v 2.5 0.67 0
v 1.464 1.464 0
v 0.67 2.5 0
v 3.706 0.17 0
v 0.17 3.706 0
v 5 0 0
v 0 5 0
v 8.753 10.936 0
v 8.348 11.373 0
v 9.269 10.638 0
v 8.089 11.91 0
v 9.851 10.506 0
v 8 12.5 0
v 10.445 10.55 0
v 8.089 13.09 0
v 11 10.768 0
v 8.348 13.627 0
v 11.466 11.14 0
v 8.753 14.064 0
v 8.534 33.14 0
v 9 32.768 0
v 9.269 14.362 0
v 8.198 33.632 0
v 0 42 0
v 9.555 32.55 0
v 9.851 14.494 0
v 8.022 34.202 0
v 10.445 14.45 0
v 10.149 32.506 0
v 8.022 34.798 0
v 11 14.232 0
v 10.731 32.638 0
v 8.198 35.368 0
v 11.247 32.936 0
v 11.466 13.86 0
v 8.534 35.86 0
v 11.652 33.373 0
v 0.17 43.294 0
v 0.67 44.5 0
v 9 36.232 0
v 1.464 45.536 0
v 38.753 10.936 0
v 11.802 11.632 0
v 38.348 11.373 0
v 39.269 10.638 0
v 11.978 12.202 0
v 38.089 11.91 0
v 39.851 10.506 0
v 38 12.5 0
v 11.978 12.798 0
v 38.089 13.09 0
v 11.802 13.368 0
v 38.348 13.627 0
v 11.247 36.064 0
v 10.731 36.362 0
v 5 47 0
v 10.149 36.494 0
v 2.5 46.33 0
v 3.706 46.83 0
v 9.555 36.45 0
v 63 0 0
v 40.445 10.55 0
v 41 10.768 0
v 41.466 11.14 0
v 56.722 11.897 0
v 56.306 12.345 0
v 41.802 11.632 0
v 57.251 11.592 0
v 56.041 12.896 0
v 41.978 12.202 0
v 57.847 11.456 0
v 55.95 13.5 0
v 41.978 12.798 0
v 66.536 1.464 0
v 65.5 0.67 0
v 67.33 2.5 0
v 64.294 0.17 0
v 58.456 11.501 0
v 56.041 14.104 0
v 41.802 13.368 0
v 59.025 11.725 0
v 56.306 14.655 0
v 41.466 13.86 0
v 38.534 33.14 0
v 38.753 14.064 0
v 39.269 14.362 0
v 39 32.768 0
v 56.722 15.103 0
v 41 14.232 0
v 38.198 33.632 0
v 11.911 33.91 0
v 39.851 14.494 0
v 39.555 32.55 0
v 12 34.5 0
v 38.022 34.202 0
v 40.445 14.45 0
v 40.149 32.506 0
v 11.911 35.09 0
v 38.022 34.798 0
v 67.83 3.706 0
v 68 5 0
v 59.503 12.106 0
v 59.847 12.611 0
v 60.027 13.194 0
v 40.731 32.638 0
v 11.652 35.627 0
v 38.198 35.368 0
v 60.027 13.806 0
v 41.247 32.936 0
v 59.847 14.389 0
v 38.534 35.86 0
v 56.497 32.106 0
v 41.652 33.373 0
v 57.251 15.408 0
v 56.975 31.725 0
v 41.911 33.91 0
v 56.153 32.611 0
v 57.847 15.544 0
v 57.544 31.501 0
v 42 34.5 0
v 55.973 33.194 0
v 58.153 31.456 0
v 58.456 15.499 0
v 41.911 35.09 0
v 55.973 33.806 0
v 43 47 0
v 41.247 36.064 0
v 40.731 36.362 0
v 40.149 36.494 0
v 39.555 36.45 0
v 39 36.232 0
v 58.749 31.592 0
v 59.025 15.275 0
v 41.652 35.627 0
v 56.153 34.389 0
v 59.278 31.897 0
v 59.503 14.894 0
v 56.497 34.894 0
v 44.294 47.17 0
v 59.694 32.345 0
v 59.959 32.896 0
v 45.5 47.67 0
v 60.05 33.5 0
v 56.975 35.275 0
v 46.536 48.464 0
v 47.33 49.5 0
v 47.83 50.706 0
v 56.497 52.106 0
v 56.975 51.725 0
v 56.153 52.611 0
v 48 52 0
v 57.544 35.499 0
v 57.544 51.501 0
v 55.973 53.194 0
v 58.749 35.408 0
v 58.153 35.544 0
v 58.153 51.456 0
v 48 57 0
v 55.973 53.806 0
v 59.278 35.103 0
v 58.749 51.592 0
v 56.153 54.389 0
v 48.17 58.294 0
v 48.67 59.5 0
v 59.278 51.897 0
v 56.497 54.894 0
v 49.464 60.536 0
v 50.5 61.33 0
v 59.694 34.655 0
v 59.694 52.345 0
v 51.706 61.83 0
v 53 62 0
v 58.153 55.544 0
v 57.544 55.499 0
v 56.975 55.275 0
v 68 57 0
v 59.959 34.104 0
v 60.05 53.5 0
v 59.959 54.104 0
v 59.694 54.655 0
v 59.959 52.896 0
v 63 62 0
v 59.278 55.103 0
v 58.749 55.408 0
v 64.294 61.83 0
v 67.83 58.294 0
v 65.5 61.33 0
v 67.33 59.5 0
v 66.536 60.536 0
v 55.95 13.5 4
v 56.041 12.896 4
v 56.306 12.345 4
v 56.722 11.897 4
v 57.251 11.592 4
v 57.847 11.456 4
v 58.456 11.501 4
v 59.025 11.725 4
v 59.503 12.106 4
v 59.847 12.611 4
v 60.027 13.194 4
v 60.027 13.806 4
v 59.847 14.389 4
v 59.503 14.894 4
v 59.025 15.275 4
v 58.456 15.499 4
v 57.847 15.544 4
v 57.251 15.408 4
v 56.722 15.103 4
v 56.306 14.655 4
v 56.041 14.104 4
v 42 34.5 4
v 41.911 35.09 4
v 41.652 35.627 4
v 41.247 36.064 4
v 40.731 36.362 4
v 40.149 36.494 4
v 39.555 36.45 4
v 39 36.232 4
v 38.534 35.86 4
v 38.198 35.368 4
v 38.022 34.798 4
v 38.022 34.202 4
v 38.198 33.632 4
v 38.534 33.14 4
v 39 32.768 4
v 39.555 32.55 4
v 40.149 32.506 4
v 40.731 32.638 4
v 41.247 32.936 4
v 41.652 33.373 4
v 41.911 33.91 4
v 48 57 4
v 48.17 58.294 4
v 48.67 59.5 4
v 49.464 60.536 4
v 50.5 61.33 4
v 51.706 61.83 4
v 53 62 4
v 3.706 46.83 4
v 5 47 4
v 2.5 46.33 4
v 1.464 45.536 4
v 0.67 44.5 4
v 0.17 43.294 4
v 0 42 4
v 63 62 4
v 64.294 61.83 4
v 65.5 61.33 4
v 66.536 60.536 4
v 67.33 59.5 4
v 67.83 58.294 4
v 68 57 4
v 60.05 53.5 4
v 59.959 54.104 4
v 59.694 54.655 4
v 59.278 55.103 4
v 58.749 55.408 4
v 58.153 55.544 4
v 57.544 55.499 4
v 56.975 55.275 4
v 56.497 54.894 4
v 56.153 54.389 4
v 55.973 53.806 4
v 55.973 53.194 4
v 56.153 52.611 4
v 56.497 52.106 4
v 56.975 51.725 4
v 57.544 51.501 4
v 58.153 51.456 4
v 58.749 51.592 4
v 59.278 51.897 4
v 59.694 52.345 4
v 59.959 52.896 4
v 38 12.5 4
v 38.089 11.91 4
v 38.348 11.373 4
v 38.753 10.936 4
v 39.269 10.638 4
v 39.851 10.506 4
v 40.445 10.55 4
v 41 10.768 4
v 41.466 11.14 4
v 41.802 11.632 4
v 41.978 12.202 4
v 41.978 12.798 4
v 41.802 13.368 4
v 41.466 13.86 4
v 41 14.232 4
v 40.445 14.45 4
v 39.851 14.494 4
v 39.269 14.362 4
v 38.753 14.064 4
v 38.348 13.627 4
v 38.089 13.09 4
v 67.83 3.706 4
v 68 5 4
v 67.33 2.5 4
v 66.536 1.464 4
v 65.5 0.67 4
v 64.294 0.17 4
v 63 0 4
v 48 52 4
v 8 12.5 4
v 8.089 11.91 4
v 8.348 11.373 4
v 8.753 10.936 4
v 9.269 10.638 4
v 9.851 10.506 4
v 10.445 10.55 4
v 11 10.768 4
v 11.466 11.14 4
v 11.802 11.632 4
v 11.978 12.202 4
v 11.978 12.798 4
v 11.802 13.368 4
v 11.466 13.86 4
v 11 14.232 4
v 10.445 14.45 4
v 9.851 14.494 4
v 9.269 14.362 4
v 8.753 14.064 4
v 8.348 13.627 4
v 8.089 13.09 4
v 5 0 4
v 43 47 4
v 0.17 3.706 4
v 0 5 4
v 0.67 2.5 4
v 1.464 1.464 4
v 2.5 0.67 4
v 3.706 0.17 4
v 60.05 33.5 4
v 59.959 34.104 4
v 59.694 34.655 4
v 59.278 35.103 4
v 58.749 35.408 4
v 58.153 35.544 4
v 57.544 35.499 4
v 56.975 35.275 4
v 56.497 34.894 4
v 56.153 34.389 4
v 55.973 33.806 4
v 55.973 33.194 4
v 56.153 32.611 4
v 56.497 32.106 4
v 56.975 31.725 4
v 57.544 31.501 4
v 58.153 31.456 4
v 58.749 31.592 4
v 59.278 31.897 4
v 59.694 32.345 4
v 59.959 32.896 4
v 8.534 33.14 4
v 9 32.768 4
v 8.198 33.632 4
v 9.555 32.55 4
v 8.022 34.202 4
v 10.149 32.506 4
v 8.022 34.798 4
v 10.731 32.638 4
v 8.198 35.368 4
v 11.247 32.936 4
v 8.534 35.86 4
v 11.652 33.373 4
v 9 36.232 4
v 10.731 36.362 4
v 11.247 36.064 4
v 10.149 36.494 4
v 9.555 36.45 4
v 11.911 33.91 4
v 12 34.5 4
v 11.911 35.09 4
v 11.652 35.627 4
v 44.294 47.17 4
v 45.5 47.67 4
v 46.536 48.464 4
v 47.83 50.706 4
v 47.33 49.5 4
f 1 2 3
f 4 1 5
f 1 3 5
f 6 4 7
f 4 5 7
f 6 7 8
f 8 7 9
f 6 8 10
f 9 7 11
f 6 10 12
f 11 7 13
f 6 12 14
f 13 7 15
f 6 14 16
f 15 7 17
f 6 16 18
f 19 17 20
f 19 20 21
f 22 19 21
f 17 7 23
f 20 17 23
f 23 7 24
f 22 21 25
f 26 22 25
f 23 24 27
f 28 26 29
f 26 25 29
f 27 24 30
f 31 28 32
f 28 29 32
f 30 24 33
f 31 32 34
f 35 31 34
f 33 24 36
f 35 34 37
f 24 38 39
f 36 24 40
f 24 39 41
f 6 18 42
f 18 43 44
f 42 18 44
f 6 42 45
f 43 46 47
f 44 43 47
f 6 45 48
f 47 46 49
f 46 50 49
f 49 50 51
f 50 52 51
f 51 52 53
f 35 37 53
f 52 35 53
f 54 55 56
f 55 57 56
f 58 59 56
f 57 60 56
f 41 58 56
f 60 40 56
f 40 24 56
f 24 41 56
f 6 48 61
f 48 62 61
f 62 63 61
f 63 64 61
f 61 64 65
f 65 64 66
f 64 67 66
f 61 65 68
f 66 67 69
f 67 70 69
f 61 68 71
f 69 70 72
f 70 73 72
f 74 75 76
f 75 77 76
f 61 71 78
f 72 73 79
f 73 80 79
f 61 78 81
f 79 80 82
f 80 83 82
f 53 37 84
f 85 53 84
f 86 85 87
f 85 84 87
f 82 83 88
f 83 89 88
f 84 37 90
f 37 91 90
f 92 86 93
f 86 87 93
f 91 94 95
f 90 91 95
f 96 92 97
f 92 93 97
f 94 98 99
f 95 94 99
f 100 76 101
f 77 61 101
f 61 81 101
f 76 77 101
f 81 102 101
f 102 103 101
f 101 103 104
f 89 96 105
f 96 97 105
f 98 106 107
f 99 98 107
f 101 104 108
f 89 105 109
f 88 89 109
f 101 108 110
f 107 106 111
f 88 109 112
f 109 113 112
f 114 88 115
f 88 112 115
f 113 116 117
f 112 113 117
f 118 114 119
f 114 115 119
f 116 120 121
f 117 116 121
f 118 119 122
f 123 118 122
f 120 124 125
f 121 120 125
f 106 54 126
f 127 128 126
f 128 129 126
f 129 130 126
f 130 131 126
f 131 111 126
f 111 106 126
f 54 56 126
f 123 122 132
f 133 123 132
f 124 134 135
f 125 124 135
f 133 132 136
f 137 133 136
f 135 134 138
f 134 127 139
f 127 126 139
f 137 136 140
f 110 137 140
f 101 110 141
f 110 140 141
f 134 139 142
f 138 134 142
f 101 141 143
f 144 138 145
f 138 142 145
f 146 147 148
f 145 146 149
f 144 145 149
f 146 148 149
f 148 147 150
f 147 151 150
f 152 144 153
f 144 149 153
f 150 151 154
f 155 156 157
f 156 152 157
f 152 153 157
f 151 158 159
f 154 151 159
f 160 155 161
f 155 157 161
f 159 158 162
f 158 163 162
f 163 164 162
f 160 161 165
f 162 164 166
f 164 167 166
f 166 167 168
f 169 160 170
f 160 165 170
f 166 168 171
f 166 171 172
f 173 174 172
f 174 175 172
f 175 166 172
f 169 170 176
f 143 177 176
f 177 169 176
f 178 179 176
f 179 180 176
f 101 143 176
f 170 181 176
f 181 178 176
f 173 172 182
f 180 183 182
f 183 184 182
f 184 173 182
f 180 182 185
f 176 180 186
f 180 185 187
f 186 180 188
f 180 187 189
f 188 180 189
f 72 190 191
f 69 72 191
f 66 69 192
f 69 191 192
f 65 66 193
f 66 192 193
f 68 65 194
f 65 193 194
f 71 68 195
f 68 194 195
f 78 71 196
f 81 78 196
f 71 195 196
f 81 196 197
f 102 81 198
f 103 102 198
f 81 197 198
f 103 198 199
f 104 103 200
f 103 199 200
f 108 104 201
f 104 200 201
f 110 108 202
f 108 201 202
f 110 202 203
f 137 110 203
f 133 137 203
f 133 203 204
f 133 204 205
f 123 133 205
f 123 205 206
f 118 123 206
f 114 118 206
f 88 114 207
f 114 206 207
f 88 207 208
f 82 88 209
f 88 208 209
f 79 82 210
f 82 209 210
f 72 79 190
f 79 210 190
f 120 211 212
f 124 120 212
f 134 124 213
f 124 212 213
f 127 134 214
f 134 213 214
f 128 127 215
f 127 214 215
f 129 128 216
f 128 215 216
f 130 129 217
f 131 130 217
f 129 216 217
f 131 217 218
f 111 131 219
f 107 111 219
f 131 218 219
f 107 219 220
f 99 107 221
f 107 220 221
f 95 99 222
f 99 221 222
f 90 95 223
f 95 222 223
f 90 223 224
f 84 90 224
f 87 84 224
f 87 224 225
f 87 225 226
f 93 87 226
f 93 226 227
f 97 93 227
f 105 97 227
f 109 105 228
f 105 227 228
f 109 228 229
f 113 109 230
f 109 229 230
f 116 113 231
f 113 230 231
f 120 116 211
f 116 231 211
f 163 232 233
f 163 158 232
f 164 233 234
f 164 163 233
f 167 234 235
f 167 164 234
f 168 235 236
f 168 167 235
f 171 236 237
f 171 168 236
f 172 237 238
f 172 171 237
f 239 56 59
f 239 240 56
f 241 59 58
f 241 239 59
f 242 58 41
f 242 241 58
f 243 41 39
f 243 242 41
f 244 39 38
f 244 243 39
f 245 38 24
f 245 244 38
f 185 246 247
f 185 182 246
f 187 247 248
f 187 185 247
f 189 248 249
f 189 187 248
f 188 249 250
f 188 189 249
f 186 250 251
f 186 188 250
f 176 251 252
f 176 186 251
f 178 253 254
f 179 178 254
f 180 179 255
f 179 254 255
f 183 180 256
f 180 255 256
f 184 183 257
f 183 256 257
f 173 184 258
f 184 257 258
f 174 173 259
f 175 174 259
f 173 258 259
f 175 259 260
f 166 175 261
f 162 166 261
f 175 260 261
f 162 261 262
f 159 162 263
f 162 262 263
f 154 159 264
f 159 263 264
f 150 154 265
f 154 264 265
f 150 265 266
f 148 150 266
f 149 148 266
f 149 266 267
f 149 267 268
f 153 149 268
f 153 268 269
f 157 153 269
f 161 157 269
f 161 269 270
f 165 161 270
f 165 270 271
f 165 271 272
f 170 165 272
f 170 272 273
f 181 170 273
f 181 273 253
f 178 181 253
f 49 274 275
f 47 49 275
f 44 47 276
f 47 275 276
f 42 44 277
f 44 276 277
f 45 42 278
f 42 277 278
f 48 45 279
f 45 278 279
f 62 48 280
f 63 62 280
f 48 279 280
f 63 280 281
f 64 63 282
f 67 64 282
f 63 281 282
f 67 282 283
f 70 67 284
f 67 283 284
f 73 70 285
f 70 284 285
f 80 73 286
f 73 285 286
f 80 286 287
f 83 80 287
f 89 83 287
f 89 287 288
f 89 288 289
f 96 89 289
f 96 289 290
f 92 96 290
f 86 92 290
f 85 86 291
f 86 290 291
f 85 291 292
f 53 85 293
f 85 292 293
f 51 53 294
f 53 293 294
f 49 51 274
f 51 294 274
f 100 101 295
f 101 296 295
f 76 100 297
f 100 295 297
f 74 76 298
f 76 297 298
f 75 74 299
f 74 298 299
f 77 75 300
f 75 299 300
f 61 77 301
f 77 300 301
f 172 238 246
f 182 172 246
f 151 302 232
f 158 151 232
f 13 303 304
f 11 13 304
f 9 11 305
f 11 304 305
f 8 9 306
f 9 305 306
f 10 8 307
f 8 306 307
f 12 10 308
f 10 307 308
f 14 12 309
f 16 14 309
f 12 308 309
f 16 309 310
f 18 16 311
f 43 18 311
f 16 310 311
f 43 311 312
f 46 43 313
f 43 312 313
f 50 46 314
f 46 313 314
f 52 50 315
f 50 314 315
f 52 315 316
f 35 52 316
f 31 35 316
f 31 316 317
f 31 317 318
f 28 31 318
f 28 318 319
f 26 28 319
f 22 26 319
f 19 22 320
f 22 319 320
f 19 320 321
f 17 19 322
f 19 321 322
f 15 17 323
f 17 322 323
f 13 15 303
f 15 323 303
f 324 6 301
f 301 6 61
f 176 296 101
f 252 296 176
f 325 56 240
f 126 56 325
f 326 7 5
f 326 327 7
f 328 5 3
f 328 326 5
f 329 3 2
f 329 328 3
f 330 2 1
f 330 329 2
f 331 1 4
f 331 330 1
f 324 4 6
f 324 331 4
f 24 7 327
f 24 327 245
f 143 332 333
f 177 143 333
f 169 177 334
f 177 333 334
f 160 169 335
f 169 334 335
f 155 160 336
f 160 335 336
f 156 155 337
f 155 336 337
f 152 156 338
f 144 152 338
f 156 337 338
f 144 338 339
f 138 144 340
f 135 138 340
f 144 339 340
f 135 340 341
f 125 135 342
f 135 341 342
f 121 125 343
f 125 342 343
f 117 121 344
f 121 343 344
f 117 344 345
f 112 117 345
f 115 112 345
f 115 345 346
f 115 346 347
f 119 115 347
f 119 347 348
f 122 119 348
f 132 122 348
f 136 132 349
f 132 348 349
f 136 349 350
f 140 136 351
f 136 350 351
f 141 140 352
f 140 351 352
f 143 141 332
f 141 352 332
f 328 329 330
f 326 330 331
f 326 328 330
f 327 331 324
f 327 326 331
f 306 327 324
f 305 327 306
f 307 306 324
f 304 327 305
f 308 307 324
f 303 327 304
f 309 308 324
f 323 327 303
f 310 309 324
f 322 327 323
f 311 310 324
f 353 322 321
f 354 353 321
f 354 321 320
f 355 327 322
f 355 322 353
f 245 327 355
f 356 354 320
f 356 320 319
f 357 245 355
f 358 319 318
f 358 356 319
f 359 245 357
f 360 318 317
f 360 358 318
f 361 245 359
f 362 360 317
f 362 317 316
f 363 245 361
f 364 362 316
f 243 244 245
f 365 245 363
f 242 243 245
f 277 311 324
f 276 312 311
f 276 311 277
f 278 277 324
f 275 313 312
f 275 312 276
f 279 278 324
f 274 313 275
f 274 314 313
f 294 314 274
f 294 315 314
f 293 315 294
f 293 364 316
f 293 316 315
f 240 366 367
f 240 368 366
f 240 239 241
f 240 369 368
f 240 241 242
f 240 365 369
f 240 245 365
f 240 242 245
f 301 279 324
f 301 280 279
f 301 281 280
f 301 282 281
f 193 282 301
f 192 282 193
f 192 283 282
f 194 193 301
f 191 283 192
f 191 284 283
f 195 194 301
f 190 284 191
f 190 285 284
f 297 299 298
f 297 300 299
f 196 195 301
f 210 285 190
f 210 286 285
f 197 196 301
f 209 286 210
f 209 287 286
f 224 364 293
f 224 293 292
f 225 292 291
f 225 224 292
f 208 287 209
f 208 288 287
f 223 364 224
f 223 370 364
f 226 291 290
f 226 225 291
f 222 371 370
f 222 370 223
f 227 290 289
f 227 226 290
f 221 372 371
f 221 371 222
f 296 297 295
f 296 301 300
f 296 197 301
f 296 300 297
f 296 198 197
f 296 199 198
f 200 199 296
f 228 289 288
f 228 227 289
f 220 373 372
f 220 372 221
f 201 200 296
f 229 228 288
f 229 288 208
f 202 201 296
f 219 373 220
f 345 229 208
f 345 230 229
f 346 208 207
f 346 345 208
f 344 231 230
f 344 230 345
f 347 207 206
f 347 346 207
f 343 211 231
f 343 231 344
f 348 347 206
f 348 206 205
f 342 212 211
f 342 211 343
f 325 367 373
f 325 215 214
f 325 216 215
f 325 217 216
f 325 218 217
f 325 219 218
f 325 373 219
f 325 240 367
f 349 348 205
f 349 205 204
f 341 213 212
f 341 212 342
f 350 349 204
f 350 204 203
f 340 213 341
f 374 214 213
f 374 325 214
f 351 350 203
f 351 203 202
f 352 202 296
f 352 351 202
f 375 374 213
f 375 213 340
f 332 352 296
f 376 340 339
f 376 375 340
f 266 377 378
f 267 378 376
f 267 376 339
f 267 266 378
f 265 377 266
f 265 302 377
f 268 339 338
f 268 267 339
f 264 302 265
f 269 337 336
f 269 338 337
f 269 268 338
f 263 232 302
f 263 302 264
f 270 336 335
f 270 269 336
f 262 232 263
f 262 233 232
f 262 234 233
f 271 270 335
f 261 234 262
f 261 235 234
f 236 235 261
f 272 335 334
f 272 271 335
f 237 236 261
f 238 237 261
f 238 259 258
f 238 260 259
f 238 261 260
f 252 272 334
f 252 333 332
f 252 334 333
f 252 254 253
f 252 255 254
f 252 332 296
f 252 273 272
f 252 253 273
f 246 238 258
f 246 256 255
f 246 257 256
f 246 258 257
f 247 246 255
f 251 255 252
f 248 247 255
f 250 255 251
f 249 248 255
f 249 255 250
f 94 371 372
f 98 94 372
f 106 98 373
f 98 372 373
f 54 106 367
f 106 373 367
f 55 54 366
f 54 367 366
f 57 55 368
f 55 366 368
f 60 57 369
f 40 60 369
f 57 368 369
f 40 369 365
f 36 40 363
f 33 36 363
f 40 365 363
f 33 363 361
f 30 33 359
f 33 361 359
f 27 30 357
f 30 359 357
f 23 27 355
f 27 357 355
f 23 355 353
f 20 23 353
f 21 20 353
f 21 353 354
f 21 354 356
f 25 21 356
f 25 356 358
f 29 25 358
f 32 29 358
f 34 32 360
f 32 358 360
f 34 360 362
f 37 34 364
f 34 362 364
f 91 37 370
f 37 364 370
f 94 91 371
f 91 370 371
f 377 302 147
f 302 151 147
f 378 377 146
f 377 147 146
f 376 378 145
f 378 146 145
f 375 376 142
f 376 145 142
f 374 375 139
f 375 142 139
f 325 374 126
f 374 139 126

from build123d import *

# Parameters (mm, degrees)
SKETCH_1_W          = 68
SKETCH_1_H          = 47
EXTRUDE_1_DEPTH     = 4
SKETCH_2_R          = 2
SKETCH_2_R_2        = 2.05
CUT_EXTRUDE_1_DEPTH = 4
SKETCH_5_W          = 20
SKETCH_5_H          = 15
EXTRUDE_3_DEPTH     = 4
SKETCH_6_R          = 2.05
CUT_EXTRUDE_3_DEPTH = 12
FILLET_3_R          = 5


with BuildPart() as part:
    # 草图1 → 凸台-拉伸1 (new body)
    with BuildSketch(Plane.XY):
        with Locations((34, 23.5)):
            Rectangle(SKETCH_1_W, SKETCH_1_H)
    extrude(amount=EXTRUDE_1_DEPTH)

    # 草图2 → 切除-拉伸1 (cut)
    with BuildSketch(Plane.XY.offset(4)):
        with Locations((10, 34.5)):
            Circle(SKETCH_2_R)
        with Locations(Location((10, 12.5, 0), (0, 0, 180))):
            Circle(SKETCH_2_R)
        with Locations((40, 34.5)):
            Circle(SKETCH_2_R)
        with Locations(Location((40, 12.5, 0), (0, 0, 180))):
            Circle(SKETCH_2_R)
        with Locations((58, 33.5)):
            Circle(SKETCH_2_R_2)
        with Locations(Location((58, 13.5, 0), (0, 0, 180))):
            Circle(SKETCH_2_R_2)
    extrude(amount=-CUT_EXTRUDE_1_DEPTH, mode=Mode.SUBTRACT)

    # 草图5 → 凸台-拉伸3 (add)
    with BuildSketch(Plane.XY.offset(4)):
        with Locations((58, 54.5)):
            Rectangle(SKETCH_5_W, SKETCH_5_H)
    extrude(amount=-EXTRUDE_3_DEPTH)

    # 草图6 → 切除-拉伸3 (cut)
    with BuildSketch(Plane.XY.offset(4)):
        with Locations((58, 33.5)):
            Circle(SKETCH_6_R)
        with Locations((58, 53.5)):
            Circle(SKETCH_6_R)
    extrude(amount=-CUT_EXTRUDE_3_DEPTH, mode=Mode.SUBTRACT)

    # 圆角3
    fillet_3_edges = [part.edges().sort_by_distance(p)[0] for p in [
        (68, 62, 2),
        (48, 47, 2),
        (48, 62, 2),
        (0, 47, 2),
        (68, 0, 2),
        (0, 0, 2),
    ]]
    fillet(fillet_3_edges, radius=FILLET_3_R)


solid = part.part
